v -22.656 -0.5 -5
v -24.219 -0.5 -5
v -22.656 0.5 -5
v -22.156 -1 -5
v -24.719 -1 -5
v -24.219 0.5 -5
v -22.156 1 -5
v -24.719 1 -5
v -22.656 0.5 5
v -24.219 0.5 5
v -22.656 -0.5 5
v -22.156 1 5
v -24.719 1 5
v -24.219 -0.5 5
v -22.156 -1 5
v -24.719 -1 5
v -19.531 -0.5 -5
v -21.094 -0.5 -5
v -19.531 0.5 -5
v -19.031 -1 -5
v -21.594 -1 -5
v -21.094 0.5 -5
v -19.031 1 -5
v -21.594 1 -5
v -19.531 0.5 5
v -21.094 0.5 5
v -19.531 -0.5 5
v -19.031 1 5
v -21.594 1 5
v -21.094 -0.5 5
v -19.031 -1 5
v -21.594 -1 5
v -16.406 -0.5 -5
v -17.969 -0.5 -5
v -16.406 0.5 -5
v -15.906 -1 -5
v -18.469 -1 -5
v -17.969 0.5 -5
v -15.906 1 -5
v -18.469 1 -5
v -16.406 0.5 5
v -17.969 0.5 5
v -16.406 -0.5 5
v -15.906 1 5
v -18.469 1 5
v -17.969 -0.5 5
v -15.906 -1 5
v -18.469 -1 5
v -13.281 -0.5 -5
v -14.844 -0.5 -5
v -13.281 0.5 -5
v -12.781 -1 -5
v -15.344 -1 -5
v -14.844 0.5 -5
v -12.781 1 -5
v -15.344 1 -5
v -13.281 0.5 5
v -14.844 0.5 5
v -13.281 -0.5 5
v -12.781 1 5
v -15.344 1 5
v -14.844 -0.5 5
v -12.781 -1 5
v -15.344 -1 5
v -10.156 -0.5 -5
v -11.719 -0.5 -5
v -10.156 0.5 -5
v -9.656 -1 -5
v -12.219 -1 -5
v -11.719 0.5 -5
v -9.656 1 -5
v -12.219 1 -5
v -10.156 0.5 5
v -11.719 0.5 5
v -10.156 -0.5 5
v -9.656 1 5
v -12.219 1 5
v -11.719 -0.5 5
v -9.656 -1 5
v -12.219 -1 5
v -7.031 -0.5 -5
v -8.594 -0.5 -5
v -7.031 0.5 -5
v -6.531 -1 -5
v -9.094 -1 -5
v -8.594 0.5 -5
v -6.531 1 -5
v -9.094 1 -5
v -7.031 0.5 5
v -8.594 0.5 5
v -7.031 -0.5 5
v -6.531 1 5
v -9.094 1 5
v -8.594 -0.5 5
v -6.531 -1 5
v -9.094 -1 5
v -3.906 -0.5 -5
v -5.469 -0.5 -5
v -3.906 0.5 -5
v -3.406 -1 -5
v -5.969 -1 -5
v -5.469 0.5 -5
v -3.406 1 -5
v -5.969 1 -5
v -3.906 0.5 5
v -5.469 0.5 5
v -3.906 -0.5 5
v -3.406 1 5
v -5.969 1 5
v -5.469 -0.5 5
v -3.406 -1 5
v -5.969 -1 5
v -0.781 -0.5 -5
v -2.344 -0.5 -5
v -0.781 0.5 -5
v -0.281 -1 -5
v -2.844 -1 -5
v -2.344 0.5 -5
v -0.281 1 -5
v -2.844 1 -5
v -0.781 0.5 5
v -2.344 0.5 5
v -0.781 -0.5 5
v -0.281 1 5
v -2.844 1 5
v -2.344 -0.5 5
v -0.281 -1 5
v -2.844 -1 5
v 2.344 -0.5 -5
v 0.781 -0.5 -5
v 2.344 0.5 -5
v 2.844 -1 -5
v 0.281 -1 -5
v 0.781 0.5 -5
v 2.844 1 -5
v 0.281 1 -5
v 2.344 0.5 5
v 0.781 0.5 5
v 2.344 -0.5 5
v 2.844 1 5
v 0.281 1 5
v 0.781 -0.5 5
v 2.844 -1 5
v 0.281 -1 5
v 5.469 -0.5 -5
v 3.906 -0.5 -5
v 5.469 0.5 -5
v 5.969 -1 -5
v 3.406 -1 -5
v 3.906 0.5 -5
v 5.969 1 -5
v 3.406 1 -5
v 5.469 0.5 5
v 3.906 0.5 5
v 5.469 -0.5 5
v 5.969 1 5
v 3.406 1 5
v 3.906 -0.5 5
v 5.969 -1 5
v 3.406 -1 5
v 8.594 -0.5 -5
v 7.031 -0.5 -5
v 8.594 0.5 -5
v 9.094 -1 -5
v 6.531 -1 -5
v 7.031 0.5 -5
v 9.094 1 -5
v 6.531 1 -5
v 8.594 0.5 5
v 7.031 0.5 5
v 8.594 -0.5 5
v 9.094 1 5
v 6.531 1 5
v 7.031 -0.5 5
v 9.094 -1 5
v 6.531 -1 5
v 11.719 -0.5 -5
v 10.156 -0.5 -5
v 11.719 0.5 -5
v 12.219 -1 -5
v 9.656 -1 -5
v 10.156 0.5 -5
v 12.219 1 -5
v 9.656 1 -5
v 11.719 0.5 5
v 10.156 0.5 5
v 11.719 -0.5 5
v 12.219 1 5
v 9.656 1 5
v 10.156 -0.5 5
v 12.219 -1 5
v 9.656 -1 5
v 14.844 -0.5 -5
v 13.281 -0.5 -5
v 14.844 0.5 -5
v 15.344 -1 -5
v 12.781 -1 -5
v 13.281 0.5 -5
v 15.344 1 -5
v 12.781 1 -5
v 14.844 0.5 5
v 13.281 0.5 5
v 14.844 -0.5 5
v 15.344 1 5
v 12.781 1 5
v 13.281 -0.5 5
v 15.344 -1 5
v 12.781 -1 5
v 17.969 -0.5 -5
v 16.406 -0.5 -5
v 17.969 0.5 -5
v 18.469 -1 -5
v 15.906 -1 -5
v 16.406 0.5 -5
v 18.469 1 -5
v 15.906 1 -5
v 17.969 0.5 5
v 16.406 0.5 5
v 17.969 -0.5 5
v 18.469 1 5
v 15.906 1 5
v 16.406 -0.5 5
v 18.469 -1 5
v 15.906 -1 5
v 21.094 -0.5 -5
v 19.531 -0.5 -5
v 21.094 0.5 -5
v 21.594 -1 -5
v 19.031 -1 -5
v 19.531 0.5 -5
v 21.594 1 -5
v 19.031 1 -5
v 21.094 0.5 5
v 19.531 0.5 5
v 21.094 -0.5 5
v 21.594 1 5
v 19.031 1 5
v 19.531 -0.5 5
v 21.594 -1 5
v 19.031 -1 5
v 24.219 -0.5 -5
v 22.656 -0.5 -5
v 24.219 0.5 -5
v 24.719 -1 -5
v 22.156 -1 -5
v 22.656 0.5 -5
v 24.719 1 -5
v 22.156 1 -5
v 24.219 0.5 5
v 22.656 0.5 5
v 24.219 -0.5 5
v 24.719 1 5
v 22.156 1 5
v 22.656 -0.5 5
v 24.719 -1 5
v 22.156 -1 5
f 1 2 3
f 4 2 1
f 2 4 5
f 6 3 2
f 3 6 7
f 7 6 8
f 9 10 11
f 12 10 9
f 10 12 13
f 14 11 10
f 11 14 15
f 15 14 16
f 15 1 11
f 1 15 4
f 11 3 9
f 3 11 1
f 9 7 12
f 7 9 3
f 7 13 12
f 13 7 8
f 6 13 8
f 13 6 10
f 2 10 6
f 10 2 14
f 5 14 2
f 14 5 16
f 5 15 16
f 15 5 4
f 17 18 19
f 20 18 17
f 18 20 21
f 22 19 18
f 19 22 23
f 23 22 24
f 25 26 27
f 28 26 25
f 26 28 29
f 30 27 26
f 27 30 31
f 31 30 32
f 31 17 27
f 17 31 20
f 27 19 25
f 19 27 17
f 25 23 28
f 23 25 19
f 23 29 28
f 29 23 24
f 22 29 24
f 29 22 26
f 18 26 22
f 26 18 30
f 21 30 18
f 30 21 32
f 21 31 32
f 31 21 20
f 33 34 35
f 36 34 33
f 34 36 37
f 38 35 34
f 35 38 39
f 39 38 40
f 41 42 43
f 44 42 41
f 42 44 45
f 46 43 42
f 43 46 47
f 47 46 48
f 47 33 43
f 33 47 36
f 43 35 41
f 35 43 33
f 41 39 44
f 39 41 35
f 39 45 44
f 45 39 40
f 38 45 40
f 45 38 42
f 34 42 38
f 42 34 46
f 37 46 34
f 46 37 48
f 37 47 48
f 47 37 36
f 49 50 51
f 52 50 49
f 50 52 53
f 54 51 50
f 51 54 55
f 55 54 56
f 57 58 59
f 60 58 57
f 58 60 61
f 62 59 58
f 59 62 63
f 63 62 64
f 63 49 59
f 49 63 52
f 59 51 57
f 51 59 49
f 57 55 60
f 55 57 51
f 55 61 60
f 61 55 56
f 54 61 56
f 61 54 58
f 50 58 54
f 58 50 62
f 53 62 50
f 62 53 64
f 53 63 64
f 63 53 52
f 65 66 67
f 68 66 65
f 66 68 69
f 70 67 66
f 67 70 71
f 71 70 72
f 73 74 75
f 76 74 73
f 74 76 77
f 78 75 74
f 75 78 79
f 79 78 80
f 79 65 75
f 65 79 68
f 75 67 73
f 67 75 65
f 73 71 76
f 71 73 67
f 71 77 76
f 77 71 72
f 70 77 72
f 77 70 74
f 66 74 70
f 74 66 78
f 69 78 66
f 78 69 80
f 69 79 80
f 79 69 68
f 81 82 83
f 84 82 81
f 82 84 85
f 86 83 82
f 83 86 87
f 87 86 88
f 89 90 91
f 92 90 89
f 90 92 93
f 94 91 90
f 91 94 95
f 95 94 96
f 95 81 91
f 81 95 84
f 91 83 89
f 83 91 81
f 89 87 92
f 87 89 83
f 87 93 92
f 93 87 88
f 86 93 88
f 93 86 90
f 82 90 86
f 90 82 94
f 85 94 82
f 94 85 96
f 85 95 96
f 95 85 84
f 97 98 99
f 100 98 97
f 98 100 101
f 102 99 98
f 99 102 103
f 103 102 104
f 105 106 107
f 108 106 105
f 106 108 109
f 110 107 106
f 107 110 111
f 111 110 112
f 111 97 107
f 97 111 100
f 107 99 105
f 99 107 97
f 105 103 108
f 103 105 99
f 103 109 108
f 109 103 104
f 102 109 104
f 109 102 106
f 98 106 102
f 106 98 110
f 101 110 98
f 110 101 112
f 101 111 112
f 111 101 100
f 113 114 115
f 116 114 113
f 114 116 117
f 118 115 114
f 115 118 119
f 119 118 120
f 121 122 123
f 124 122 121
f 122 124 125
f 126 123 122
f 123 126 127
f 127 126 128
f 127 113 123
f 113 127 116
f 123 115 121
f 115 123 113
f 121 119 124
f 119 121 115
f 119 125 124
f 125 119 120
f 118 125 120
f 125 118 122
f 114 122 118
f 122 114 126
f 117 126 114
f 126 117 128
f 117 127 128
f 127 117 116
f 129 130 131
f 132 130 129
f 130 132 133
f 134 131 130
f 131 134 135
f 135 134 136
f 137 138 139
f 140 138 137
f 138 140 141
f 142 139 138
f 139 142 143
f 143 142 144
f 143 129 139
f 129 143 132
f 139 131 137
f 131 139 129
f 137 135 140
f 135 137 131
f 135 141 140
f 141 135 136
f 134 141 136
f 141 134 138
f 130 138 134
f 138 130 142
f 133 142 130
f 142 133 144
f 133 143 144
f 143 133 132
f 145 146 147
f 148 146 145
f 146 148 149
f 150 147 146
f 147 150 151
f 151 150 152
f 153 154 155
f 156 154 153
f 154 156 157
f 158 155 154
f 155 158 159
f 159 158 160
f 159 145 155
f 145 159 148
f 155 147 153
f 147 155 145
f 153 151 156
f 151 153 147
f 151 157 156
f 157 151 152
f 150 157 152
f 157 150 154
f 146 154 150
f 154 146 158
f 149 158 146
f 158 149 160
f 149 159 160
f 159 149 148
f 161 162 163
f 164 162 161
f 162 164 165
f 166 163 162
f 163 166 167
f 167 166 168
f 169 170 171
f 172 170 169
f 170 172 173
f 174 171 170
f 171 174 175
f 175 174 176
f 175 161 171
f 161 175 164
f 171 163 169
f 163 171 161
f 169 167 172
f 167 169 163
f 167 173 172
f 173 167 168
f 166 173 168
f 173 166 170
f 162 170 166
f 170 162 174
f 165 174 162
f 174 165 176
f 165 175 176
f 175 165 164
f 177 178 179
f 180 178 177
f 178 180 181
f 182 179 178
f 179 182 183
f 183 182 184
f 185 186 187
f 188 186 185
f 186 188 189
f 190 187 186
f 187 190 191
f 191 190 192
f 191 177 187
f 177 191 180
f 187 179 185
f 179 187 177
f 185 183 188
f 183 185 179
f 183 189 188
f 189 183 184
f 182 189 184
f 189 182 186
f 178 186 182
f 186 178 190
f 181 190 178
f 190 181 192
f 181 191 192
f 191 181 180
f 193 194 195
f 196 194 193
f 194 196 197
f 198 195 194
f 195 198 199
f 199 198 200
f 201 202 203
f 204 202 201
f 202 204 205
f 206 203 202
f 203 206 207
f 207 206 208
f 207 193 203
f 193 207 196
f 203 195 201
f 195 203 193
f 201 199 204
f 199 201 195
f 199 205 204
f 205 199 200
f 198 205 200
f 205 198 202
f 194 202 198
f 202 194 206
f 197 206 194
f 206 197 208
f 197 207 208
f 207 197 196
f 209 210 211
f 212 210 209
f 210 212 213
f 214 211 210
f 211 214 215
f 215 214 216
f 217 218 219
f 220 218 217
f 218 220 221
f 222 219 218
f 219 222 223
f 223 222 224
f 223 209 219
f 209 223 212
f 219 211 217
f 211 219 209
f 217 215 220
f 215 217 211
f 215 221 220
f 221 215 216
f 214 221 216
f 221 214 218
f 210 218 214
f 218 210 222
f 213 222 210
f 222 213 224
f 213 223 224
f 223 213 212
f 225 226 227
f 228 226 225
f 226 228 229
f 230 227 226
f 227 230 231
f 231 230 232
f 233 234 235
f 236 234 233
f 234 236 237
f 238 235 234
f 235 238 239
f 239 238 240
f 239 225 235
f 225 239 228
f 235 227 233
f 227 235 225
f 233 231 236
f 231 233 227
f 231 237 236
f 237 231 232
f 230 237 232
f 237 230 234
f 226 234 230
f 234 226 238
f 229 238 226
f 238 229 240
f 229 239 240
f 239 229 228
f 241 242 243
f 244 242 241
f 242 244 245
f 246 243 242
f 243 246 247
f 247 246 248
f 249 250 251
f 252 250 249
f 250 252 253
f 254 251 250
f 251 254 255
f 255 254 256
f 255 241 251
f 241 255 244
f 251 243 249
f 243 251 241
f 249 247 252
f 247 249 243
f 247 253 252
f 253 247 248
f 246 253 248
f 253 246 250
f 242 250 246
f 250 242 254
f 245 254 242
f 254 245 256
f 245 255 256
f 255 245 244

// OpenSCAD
// Start: lazy_union
default_5_default_5();
// End: lazy_union

// Modules.

// 'PartMaterial undef-default - default 5.0'
module default_5_default_5() {
  // 'None : _combine_solids_and_holes'
  union() {
    // 'default : _combine_solids_and_holes'
    union() {
      // ('vane', 0)
      multmatrix(m=[[0.0, 1.0, 0.0, -23.437337222627356], [-1.0, 0.0, 0.0, 0.0], [0.0, 0.0, 1.0, -5.0], [0.0, 0.0, 0.0, 1.0]]) {
        // "('vane', 0) : _combine_solids_and_holes"
        union() {
          // ('vane', 0)
          linear_extrude(height=10.0, twist=0.0, slices=4, scale=[1.0, 1.0]) {
            polygon(points=[[0.0, 0.0], [-1.0, 0.0], [-1.0, 1.2813313886863216], [-0.5, 0.7813313886863215], [0.5, 0.7813313886863215], [1.0, 1.2813313886863216], [1.0, -1.2813313886863216], [0.5, -0.7813313886863215], [-0.5, -0.7813313886863215], [-1.0, -1.2813313886863216], [-1.0, 0.0]]);
          }
        }
      }
      // ('vane', 1)
      multmatrix(m=[[0.0, 1.0, 0.0, -20.312337222627356], [-1.0, 0.0, 0.0, 0.0], [0.0, 0.0, 1.0, -5.0], [0.0, 0.0, 0.0, 1.0]]) {
        // "('vane', 1) : _combine_solids_and_holes"
        union() {
          // ('vane', 1)
          linear_extrude(height=10.0, twist=0.0, slices=4, scale=[1.0, 1.0]) {
            polygon(points=[[0.0, 0.0], [-1.0, 0.0], [-1.0, 1.2813313886863216], [-0.5, 0.7813313886863215], [0.5, 0.7813313886863215], [1.0, 1.2813313886863216], [1.0, -1.2813313886863216], [0.5, -0.7813313886863215], [-0.5, -0.7813313886863215], [-1.0, -1.2813313886863216], [-1.0, 0.0]]);
          }
        }
      }
      // ('vane', 2)
      multmatrix(m=[[0.0, 1.0, 0.0, -17.187337222627356], [-1.0, 0.0, 0.0, 0.0], [0.0, 0.0, 1.0, -5.0], [0.0, 0.0, 0.0, 1.0]]) {
        // "('vane', 2) : _combine_solids_and_holes"
        union() {
          // ('vane', 2)
          linear_extrude(height=10.0, twist=0.0, slices=4, scale=[1.0, 1.0]) {
            polygon(points=[[0.0, 0.0], [-1.0, 0.0], [-1.0, 1.2813313886863216], [-0.5, 0.7813313886863215], [0.5, 0.7813313886863215], [1.0, 1.2813313886863216], [1.0, -1.2813313886863216], [0.5, -0.7813313886863215], [-0.5, -0.7813313886863215], [-1.0, -1.2813313886863216], [-1.0, 0.0]]);
          }
        }
      }
      // ('vane', 3)
      multmatrix(m=[[0.0, 1.0, 0.0, -14.062337222627358], [-1.0, 0.0, 0.0, 0.0], [0.0, 0.0, 1.0, -5.0], [0.0, 0.0, 0.0, 1.0]]) {
        // "('vane', 3) : _combine_solids_and_holes"
        union() {
          // ('vane', 3)
          linear_extrude(height=10.0, twist=0.0, slices=4, scale=[1.0, 1.0]) {
            polygon(points=[[0.0, 0.0], [-1.0, 0.0], [-1.0, 1.2813313886863216], [-0.5, 0.7813313886863215], [0.5, 0.7813313886863215], [1.0, 1.2813313886863216], [1.0, -1.2813313886863216], [0.5, -0.7813313886863215], [-0.5, -0.7813313886863215], [-1.0, -1.2813313886863216], [-1.0, 0.0]]);
          }
        }
      }
      // ('vane', 4)
      multmatrix(m=[[0.0, 1.0, 0.0, -10.937337222627358], [-1.0, 0.0, 0.0, 0.0], [0.0, 0.0, 1.0, -5.0], [0.0, 0.0, 0.0, 1.0]]) {
        // "('vane', 4) : _combine_solids_and_holes"
        union() {
          // ('vane', 4)
          linear_extrude(height=10.0, twist=0.0, slices=4, scale=[1.0, 1.0]) {
            polygon(points=[[0.0, 0.0], [-1.0, 0.0], [-1.0, 1.2813313886863216], [-0.5, 0.7813313886863215], [0.5, 0.7813313886863215], [1.0, 1.2813313886863216], [1.0, -1.2813313886863216], [0.5, -0.7813313886863215], [-0.5, -0.7813313886863215], [-1.0, -1.2813313886863216], [-1.0, 0.0]]);
          }
        }
      }
      // ('vane', 5)
      multmatrix(m=[[0.0, 1.0, 0.0, -7.812337222627357], [-1.0, 0.0, 0.0, 0.0], [0.0, 0.0, 1.0, -5.0], [0.0, 0.0, 0.0, 1.0]]) {
        // "('vane', 5) : _combine_solids_and_holes"
        union() {
          // ('vane', 5)
          linear_extrude(height=10.0, twist=0.0, slices=4, scale=[1.0, 1.0]) {
            polygon(points=[[0.0, 0.0], [-1.0, 0.0], [-1.0, 1.2813313886863216], [-0.5, 0.7813313886863215], [0.5, 0.7813313886863215], [1.0, 1.2813313886863216], [1.0, -1.2813313886863216], [0.5, -0.7813313886863215], [-0.5, -0.7813313886863215], [-1.0, -1.2813313886863216], [-1.0, 0.0]]);
          }
        }
      }
      // ('vane', 6)
      multmatrix(m=[[0.0, 1.0, 0.0, -4.687337222627357], [-1.0, 0.0, 0.0, 0.0], [0.0, 0.0, 1.0, -5.0], [0.0, 0.0, 0.0, 1.0]]) {
        // "('vane', 6) : _combine_solids_and_holes"
        union() {
          // ('vane', 6)
          linear_extrude(height=10.0, twist=0.0, slices=4, scale=[1.0, 1.0]) {
            polygon(points=[[0.0, 0.0], [-1.0, 0.0], [-1.0, 1.2813313886863216], [-0.5, 0.7813313886863215], [0.5, 0.7813313886863215], [1.0, 1.2813313886863216], [1.0, -1.2813313886863216], [0.5, -0.7813313886863215], [-0.5, -0.7813313886863215], [-1.0, -1.2813313886863216], [-1.0, 0.0]]);
          }
        }
      }
      // ('vane', 7)
      multmatrix(m=[[0.0, 1.0, 0.0, -1.562337222627357], [-1.0, 0.0, 0.0, 0.0], [0.0, 0.0, 1.0, -5.0], [0.0, 0.0, 0.0, 1.0]]) {
        // "('vane', 7) : _combine_solids_and_holes"
        union() {
          // ('vane', 7)
          linear_extrude(height=10.0, twist=0.0, slices=4, scale=[1.0, 1.0]) {
            polygon(points=[[0.0, 0.0], [-1.0, 0.0], [-1.0, 1.2813313886863216], [-0.5, 0.7813313886863215], [0.5, 0.7813313886863215], [1.0, 1.2813313886863216], [1.0, -1.2813313886863216], [0.5, -0.7813313886863215], [-0.5, -0.7813313886863215], [-1.0, -1.2813313886863216], [-1.0, 0.0]]);
          }
        }
      }
      // ('vane', 8)
      multmatrix(m=[[0.0, 1.0, 0.0, 1.562662777372643], [-1.0, 0.0, 0.0, 0.0], [0.0, 0.0, 1.0, -5.0], [0.0, 0.0, 0.0, 1.0]]) {
        // "('vane', 8) : _combine_solids_and_holes"
        union() {
          // ('vane', 8)
          linear_extrude(height=10.0, twist=0.0, slices=4, scale=[1.0, 1.0]) {
            polygon(points=[[0.0, 0.0], [-1.0, 0.0], [-1.0, 1.2813313886863216], [-0.5, 0.7813313886863215], [0.5, 0.7813313886863215], [1.0, 1.2813313886863216], [1.0, -1.2813313886863216], [0.5, -0.7813313886863215], [-0.5, -0.7813313886863215], [-1.0, -1.2813313886863216], [-1.0, 0.0]]);
          }
        }
      }
      // ('vane', 9)
      multmatrix(m=[[0.0, 1.0, 0.0, 4.687662777372643], [-1.0, 0.0, 0.0, 0.0], [0.0, 0.0, 1.0, -5.0], [0.0, 0.0, 0.0, 1.0]]) {
        // "('vane', 9) : _combine_solids_and_holes"
        union() {
          // ('vane', 9)
          linear_extrude(height=10.0, twist=0.0, slices=4, scale=[1.0, 1.0]) {
            polygon(points=[[0.0, 0.0], [-1.0, 0.0], [-1.0, 1.2813313886863216], [-0.5, 0.7813313886863215], [0.5, 0.7813313886863215], [1.0, 1.2813313886863216], [1.0, -1.2813313886863216], [0.5, -0.7813313886863215], [-0.5, -0.7813313886863215], [-1.0, -1.2813313886863216], [-1.0, 0.0]]);
          }
        }
      }
      // ('vane', 10)
      multmatrix(m=[[0.0, 1.0, 0.0, 7.812662777372643], [-1.0, 0.0, 0.0, 0.0], [0.0, 0.0, 1.0, -5.0], [0.0, 0.0, 0.0, 1.0]]) {
        // "('vane', 10) : _combine_solids_and_holes"
        union() {
          // ('vane', 10)
          linear_extrude(height=10.0, twist=0.0, slices=4, scale=[1.0, 1.0]) {
            polygon(points=[[0.0, 0.0], [-1.0, 0.0], [-1.0, 1.2813313886863216], [-0.5, 0.7813313886863215], [0.5, 0.7813313886863215], [1.0, 1.2813313886863216], [1.0, -1.2813313886863216], [0.5, -0.7813313886863215], [-0.5, -0.7813313886863215], [-1.0, -1.2813313886863216], [-1.0, 0.0]]);
          }
        }
      }
      // ('vane', 11)
      multmatrix(m=[[0.0, 1.0, 0.0, 10.937662777372642], [-1.0, 0.0, 0.0, 0.0], [0.0, 0.0, 1.0, -5.0], [0.0, 0.0, 0.0, 1.0]]) {
        // "('vane', 11) : _combine_solids_and_holes"
        union() {
          // ('vane', 11)
          linear_extrude(height=10.0, twist=0.0, slices=4, scale=[1.0, 1.0]) {
            polygon(points=[[0.0, 0.0], [-1.0, 0.0], [-1.0, 1.2813313886863216], [-0.5, 0.7813313886863215], [0.5, 0.7813313886863215], [1.0, 1.2813313886863216], [1.0, -1.2813313886863216], [0.5, -0.7813313886863215], [-0.5, -0.7813313886863215], [-1.0, -1.2813313886863216], [-1.0, 0.0]]);
          }
        }
      }
      // ('vane', 12)
      multmatrix(m=[[0.0, 1.0, 0.0, 14.062662777372642], [-1.0, 0.0, 0.0, 0.0], [0.0, 0.0, 1.0, -5.0], [0.0, 0.0, 0.0, 1.0]]) {
        // "('vane', 12) : _combine_solids_and_holes"
        union() {
          // ('vane', 12)
          linear_extrude(height=10.0, twist=0.0, slices=4, scale=[1.0, 1.0]) {
            polygon(points=[[0.0, 0.0], [-1.0, 0.0], [-1.0, 1.2813313886863216], [-0.5, 0.7813313886863215], [0.5, 0.7813313886863215], [1.0, 1.2813313886863216], [1.0, -1.2813313886863216], [0.5, -0.7813313886863215], [-0.5, -0.7813313886863215], [-1.0, -1.2813313886863216], [-1.0, 0.0]]);
          }
        }
      }
      // ('vane', 13)
      multmatrix(m=[[0.0, 1.0, 0.0, 17.187662777372644], [-1.0, 0.0, 0.0, 0.0], [0.0, 0.0, 1.0, -5.0], [0.0, 0.0, 0.0, 1.0]]) {
        // "('vane', 13) : _combine_solids_and_holes"
        union() {
          // ('vane', 13)
          linear_extrude(height=10.0, twist=0.0, slices=4, scale=[1.0, 1.0]) {
            polygon(points=[[0.0, 0.0], [-1.0, 0.0], [-1.0, 1.2813313886863216], [-0.5, 0.7813313886863215], [0.5, 0.7813313886863215], [1.0, 1.2813313886863216], [1.0, -1.2813313886863216], [0.5, -0.7813313886863215], [-0.5, -0.7813313886863215], [-1.0, -1.2813313886863216], [-1.0, 0.0]]);
          }
        }
      }
      // ('vane', 14)
      multmatrix(m=[[0.0, 1.0, 0.0, 20.312662777372644], [-1.0, 0.0, 0.0, 0.0], [0.0, 0.0, 1.0, -5.0], [0.0, 0.0, 0.0, 1.0]]) {
        // "('vane', 14) : _combine_solids_and_holes"
        union() {
          // ('vane', 14)
          linear_extrude(height=10.0, twist=0.0, slices=4, scale=[1.0, 1.0]) {
            polygon(points=[[0.0, 0.0], [-1.0, 0.0], [-1.0, 1.2813313886863216], [-0.5, 0.7813313886863215], [0.5, 0.7813313886863215], [1.0, 1.2813313886863216], [1.0, -1.2813313886863216], [0.5, -0.7813313886863215], [-0.5, -0.7813313886863215], [-1.0, -1.2813313886863216], [-1.0, 0.0]]);
          }
        }
      }
      // ('vane', 15)
      multmatrix(m=[[0.0, 1.0, 0.0, 23.437662777372644], [-1.0, 0.0, 0.0, 0.0], [0.0, 0.0, 1.0, -5.0], [0.0, 0.0, 0.0, 1.0]]) {
        // "('vane', 15) : _combine_solids_and_holes"
        union() {
          // ('vane', 15)
          linear_extrude(height=10.0, twist=0.0, slices=4, scale=[1.0, 1.0]) {
            polygon(points=[[0.0, 0.0], [-1.0, 0.0], [-1.0, 1.2813313886863216], [-0.5, 0.7813313886863215], [0.5, 0.7813313886863215], [1.0, 1.2813313886863216], [1.0, -1.2813313886863216], [0.5, -0.7813313886863215], [-0.5, -0.7813313886863215], [-1.0, -1.2813313886863216], [-1.0, 0.0]]);
          }
        }
      }
    }
  }
} // end module default_5_default_5
